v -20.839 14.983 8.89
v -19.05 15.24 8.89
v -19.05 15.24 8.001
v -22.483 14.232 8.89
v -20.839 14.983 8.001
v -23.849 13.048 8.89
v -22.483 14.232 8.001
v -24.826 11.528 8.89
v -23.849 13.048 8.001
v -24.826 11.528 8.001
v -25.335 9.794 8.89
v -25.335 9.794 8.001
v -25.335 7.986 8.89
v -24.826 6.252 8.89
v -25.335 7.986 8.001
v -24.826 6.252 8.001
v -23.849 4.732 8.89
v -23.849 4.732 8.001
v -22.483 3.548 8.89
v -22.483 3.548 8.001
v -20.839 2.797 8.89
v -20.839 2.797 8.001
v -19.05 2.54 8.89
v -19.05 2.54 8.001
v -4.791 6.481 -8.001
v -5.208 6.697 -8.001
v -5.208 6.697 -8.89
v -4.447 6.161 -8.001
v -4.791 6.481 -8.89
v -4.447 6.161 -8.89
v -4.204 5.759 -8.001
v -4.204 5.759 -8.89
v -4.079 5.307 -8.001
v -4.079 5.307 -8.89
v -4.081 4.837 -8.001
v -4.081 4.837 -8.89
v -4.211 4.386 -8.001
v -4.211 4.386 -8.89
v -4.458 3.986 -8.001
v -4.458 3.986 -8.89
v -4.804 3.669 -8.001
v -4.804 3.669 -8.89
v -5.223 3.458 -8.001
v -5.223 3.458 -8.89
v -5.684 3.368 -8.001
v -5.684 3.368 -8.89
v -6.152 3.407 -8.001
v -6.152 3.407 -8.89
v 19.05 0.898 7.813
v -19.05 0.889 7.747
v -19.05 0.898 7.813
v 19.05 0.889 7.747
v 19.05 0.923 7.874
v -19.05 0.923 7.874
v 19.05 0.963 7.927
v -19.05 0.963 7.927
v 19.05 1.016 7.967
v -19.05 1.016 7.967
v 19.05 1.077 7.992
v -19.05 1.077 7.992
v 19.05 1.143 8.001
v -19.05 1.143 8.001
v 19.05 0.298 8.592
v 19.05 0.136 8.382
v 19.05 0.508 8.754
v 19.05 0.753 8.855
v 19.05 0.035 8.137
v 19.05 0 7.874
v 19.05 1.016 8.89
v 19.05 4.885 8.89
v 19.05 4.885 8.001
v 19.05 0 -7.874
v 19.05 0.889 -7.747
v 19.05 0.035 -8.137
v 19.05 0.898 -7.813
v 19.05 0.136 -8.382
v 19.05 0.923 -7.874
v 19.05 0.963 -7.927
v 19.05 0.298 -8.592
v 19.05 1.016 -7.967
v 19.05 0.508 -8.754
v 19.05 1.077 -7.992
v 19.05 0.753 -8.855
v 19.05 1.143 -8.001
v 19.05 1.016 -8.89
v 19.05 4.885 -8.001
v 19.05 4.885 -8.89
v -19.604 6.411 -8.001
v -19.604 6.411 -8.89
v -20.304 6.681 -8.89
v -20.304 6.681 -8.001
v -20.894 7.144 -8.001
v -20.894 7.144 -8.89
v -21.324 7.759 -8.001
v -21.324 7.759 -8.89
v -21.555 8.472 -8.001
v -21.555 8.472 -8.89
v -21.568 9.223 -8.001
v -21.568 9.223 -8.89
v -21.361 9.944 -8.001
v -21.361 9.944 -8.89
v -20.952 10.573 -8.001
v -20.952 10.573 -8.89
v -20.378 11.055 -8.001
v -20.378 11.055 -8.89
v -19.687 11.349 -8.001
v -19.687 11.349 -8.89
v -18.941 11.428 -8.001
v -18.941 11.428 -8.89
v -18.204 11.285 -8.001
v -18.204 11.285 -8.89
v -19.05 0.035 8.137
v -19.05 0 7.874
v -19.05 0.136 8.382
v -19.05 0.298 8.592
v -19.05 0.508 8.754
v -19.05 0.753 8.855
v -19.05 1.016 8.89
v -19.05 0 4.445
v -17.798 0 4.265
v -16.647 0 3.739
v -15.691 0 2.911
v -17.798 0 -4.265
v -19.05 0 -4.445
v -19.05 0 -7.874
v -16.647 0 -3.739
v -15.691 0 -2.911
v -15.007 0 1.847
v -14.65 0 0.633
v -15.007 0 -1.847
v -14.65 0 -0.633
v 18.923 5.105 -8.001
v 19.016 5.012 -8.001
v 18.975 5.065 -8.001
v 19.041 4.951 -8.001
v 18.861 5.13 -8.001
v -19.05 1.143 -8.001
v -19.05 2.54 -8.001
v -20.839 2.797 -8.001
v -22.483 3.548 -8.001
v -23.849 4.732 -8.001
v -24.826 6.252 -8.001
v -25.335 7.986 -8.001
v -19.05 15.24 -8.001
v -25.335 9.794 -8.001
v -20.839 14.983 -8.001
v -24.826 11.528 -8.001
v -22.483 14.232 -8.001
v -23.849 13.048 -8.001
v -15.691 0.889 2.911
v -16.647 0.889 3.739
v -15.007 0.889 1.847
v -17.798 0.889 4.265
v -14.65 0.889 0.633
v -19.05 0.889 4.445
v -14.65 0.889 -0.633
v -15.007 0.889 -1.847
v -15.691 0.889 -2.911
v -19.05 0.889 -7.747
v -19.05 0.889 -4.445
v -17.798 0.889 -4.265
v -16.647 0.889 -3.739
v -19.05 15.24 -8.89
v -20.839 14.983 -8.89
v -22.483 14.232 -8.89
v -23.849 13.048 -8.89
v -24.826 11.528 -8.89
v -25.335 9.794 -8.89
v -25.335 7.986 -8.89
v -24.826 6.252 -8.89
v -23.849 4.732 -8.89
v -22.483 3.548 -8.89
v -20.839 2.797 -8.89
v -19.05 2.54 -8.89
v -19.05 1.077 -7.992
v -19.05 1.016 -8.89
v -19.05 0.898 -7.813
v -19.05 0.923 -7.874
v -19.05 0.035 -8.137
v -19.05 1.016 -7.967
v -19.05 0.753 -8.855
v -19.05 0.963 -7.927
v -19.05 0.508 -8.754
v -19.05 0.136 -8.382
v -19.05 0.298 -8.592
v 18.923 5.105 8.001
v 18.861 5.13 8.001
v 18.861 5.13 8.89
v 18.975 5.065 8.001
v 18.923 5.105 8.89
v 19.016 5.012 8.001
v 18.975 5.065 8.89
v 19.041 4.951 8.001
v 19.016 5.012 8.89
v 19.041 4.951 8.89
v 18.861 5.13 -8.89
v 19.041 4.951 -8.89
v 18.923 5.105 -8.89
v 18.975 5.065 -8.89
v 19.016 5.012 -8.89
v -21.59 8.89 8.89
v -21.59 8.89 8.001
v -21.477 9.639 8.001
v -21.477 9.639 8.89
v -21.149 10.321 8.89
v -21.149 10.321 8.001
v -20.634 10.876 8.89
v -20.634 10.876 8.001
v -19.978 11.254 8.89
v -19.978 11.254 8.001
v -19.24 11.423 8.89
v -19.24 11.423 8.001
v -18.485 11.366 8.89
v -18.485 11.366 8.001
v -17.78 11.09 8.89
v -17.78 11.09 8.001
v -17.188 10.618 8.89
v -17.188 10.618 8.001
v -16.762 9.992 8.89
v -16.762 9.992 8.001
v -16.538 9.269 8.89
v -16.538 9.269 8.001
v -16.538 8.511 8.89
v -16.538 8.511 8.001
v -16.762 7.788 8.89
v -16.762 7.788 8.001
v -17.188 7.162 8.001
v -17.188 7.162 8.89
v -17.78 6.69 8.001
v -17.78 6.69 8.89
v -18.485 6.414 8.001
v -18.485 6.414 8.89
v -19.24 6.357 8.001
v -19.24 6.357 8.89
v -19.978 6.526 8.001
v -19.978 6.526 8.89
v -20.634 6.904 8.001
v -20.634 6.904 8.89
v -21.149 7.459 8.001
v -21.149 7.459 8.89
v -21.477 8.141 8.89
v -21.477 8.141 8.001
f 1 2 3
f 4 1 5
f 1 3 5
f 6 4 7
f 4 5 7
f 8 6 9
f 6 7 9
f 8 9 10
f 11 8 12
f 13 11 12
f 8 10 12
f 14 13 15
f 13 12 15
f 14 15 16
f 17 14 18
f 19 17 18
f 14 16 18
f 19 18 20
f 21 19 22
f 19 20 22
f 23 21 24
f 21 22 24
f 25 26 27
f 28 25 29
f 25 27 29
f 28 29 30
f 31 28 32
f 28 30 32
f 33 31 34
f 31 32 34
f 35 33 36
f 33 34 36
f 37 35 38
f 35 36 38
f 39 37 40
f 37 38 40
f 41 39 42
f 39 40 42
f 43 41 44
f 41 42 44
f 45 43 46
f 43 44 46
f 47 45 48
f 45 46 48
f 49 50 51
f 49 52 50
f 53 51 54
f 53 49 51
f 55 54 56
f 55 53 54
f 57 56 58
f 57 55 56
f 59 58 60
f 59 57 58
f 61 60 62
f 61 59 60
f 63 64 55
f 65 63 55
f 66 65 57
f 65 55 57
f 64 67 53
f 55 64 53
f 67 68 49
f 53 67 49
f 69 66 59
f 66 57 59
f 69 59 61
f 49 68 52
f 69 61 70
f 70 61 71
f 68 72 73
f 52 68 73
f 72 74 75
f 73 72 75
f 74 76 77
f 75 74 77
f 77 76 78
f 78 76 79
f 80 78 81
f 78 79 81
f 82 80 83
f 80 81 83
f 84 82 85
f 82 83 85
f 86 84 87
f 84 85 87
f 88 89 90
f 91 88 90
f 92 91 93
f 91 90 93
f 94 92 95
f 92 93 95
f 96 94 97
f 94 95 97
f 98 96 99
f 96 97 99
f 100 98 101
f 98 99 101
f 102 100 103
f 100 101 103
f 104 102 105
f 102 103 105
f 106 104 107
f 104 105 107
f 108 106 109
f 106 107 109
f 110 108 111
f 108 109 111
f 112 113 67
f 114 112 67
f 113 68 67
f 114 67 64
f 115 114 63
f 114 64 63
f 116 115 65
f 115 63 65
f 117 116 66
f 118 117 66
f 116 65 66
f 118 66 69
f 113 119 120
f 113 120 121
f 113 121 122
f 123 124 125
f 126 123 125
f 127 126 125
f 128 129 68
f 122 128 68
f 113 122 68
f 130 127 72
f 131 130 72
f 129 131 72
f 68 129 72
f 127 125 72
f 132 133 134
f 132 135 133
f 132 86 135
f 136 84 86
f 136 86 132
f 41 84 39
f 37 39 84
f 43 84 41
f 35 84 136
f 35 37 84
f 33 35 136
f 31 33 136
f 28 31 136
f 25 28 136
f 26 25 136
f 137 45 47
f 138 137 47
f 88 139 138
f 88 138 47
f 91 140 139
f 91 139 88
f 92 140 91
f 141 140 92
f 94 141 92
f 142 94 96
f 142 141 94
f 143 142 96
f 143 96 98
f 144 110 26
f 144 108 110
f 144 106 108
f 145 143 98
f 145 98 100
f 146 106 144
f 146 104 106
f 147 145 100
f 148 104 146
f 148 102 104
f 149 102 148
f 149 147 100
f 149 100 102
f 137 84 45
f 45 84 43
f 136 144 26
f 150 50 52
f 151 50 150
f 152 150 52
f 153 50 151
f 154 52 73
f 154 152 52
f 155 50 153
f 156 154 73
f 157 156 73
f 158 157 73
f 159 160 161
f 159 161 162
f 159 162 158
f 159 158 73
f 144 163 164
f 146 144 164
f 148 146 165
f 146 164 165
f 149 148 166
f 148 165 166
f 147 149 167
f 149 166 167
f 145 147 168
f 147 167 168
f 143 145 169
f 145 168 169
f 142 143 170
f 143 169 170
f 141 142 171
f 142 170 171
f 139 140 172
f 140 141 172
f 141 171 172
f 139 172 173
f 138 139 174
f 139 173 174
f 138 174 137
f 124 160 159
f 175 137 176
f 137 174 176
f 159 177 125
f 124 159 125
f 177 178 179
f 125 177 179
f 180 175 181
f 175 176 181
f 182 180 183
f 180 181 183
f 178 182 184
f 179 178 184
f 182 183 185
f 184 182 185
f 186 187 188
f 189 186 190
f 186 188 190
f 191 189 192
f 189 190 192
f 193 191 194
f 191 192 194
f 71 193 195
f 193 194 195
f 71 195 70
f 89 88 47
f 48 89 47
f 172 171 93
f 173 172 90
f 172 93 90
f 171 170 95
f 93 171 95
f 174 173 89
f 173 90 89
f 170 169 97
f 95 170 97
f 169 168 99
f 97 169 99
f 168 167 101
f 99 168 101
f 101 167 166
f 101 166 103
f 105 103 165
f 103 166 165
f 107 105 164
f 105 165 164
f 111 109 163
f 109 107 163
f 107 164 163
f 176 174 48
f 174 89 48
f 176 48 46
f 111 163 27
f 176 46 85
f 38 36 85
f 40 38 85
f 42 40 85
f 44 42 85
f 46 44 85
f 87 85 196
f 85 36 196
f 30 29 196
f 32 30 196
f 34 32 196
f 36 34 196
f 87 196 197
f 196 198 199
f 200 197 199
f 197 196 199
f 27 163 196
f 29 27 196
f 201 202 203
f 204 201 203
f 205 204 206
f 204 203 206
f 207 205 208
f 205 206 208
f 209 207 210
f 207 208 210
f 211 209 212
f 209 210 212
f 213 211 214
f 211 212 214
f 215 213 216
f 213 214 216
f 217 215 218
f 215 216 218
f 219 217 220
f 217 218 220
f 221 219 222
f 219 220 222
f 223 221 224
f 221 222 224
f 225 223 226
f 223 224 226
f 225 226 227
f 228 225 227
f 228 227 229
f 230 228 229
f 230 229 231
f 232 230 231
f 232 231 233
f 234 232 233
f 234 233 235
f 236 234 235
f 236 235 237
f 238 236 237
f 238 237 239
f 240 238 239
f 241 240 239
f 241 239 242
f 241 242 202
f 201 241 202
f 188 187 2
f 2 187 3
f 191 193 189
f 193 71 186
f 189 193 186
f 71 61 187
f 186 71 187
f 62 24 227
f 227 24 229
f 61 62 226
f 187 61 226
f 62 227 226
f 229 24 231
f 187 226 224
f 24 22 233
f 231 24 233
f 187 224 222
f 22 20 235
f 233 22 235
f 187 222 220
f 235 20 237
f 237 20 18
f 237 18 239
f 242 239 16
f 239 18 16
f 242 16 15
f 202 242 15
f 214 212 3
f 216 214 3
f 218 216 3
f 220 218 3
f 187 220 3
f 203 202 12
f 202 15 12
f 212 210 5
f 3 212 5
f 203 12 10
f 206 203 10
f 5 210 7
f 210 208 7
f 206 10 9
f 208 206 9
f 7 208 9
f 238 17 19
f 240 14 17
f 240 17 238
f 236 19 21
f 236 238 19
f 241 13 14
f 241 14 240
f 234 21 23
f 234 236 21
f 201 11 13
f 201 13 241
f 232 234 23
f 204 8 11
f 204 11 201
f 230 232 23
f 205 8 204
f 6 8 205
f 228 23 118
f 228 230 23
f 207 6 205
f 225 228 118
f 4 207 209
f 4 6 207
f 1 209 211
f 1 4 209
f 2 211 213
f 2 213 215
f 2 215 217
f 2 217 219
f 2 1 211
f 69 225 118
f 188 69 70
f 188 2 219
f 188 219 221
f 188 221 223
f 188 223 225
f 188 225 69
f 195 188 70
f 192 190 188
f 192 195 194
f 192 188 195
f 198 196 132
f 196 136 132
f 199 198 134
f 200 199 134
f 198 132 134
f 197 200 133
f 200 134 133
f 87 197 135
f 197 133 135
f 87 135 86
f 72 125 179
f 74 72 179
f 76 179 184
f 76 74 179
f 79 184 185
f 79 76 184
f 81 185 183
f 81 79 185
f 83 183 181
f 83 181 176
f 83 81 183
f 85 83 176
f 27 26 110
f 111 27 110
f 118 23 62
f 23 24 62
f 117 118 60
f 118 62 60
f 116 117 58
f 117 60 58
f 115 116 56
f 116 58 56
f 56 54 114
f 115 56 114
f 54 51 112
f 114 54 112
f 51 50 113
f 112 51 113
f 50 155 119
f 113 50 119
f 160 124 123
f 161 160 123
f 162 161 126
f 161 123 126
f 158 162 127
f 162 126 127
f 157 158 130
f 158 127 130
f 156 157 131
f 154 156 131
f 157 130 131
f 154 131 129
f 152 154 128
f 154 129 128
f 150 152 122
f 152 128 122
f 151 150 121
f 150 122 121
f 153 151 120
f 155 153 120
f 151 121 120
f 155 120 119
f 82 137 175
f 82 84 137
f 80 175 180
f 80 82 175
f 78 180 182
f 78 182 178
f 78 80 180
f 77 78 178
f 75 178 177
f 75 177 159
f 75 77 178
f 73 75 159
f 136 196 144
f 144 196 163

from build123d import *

# Parameters (mm, degrees)
EXTRUDED_BOSS_FRONT_PLANE_WING_DEPTH      = 8.89
EXTRUDED_BOSS_FRONT_PLANE_WING_DEPTH_BACK = 8.89
EXTRUDED_CUT_RIGHT_PLANE_WING_DEPTH       = 31.926520981
EXTRUDED_CUT_RIGHT_PLANE_WING_DEPTH_BACK  = 31.926520981
SKETCH3_W                                 = 16.002
SKETCH3_H                                 = 14.351
F_2X_0_2D_HOLES_D                         = 5.08
F_0_35D_HOLE_D                            = 8.89
F_0_135D_HOLE_D                           = 3.429
F_0_135D_HOLE_DEPTH                       = 0.889
F_0_2D_0_135D_HOLE_CONNECTING_CUT_DEPTH   = 35.098731369
INNER_CONNECTING_FILLET_R                 = 0.254
OUTTER_CONNECTING_FILLET_R                = 1.016


with BuildPart() as part:
    # Sketch2 → Extruded Boss Front Plane Wing (new, two sides: drawn at the far end of the back side and taken through both)
    with BuildSketch(Plane.XY.offset(-EXTRUDED_BOSS_FRONT_PLANE_WING_DEPTH_BACK)):
        with BuildLine():
            Line((-19.05, 0), (19.05, 0))
            Line((19.05, 0), (19.05, 5.08))
            Line((19.05, 5.08), (-19.05, 15.24))
            ThreePointArc((-19.05, 15.24), (-25.4, 8.89), (-19.05, 2.54))
            Line((-19.05, 2.54), (-19.05, 0))
        make_face()
    extrude(amount=EXTRUDED_BOSS_FRONT_PLANE_WING_DEPTH + EXTRUDED_BOSS_FRONT_PLANE_WING_DEPTH_BACK)

    # Sketch3 → Extruded Cut Right Plane Wing (cut, two sides: drawn at the far end of the back side and taken through both)
    with BuildSketch(Plane(origin=(0, 0, 0), x_dir=(0, 0, -1), z_dir=(1, 0, 0)).offset(-EXTRUDED_CUT_RIGHT_PLANE_WING_DEPTH_BACK)):
        with Locations((0, 8.0645)):
            Rectangle(SKETCH3_W, SKETCH3_H)
    extrude(amount=EXTRUDED_CUT_RIGHT_PLANE_WING_DEPTH + EXTRUDED_CUT_RIGHT_PLANE_WING_DEPTH_BACK, mode=Mode.SUBTRACT)

    # 2X 0.2D Holes (through all)
    with Locations(Plane.XY.offset(8.89)):
        with Locations((-19.05, 8.89)):
            Hole(F_2X_0_2D_HOLES_D / 2)

    # 0.35D Hole (through all)
    with Locations(Plane(origin=(0, 0.889, 0), x_dir=(1, 0, 0), z_dir=(0, 1, 0))):
        with Locations((-19.05, 0)):
            Hole(F_0_35D_HOLE_D / 2)

    # 0.135D Hole
    with Locations(Plane.XY.offset(-8.001)):
        with Locations((-5.7785, 5.08)):
            Hole(F_0_135D_HOLE_D / 2, depth=F_0_135D_HOLE_DEPTH)

    # Sketch14 → 0.2D-0.135D Hole Connecting Cut (cut, through all)
    with BuildSketch(Plane.XY.offset(-8.001)):
        Polygon((-19.603662053, 6.411077183), (-6.152221886, 3.406727099), (-5.207730823, 6.696704301), (-18.204416034, 11.285117483), align=None)
    extrude(amount=-F_0_2D_0_135D_HOLE_CONNECTING_CUT_DEPTH, mode=Mode.SUBTRACT)

    # Inner Connecting Fillet
    inner_connecting_fillet_edges = [part.edges().sort_by_distance(p)[0] for p in [
        (19.05, 5.08, 8.4455),
        (0, 0.889, -8.001),
        (0, 0.889, 8.001),
        (19.05, 5.08, -8.4455),
    ]]
    fillet(inner_connecting_fillet_edges, radius=INNER_CONNECTING_FILLET_R)

    # Outter Connecting Fillet
    outter_connecting_fillet_edges = [part.edges().sort_by_distance(p)[0] for p in [
        (0, 0, 8.89),
        (0, 0, -8.89),
    ]]
    fillet(outter_connecting_fillet_edges, radius=OUTTER_CONNECTING_FILLET_R)


solid = part.part
